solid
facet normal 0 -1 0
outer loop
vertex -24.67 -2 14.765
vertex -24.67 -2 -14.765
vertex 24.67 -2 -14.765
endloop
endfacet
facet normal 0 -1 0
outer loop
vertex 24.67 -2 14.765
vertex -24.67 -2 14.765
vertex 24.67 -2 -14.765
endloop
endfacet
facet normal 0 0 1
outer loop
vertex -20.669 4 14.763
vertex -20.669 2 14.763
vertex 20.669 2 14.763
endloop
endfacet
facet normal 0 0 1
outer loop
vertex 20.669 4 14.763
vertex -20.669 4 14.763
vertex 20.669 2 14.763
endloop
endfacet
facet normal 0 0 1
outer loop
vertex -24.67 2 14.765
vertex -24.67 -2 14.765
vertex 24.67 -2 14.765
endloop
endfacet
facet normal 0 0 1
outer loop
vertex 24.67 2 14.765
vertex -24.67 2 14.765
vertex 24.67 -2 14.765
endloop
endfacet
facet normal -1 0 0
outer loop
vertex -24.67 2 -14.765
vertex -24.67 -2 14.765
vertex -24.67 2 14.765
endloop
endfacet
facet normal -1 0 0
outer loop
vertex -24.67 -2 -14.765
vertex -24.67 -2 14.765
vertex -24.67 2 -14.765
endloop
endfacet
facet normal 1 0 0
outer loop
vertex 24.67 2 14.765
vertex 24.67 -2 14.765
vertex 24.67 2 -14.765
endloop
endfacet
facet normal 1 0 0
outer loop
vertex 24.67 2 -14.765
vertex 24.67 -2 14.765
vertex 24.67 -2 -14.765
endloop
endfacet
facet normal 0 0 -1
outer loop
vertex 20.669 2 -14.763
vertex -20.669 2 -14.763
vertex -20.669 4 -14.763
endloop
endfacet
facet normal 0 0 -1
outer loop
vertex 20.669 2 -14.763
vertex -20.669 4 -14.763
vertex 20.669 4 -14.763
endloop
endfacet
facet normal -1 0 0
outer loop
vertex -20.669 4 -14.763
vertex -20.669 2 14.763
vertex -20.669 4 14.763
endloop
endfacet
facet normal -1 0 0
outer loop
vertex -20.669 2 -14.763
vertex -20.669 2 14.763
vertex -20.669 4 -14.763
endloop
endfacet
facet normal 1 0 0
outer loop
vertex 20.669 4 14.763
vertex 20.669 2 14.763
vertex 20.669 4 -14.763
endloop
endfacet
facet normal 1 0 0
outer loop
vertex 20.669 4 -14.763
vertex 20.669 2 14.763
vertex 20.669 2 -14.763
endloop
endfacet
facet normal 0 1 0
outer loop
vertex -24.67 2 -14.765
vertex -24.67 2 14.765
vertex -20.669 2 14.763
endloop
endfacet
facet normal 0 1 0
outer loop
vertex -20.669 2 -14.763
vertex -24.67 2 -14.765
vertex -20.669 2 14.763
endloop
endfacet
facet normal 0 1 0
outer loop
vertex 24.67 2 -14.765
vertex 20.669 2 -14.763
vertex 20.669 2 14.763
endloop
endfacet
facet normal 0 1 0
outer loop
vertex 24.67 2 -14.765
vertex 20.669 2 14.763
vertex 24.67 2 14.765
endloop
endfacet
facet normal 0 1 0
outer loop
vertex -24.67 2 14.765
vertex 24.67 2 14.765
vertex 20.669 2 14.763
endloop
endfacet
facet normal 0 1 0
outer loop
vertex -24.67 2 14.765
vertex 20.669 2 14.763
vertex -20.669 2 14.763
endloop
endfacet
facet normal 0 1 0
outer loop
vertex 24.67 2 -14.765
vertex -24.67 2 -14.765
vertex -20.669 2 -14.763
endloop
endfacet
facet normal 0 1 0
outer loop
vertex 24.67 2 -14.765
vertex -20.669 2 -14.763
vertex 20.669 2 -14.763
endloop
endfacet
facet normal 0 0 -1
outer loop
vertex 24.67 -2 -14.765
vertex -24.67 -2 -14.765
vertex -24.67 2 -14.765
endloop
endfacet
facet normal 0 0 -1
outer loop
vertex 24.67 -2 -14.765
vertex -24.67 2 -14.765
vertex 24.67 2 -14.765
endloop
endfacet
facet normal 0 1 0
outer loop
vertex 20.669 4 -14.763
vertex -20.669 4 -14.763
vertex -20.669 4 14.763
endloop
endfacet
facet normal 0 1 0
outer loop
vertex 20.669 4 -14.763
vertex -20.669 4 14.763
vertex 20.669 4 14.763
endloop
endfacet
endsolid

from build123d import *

# Parameters (mm, degrees)
BOSS_EXTRUDE1_START = 2
SKETCH1_W           = 41.337660338
SKETCH1_H           = 29.52690024
BOSS_EXTRUDE1_DEPTH = 2
BOSS_EXTRUDE2_START = -2
SKETCH2_W           = 49.34
SKETCH2_H           = 29.53
BOSS_EXTRUDE2_DEPTH = 4


with BuildPart() as part:
    # Sketch1 → Boss-Extrude1 (new body)
    with BuildSketch(Plane(origin=(0, 0, 0), x_dir=(1, 0, 0), z_dir=(0, 1, 0)).offset(BOSS_EXTRUDE1_START)):
        Rectangle(SKETCH1_W, SKETCH1_H)
    extrude(amount=BOSS_EXTRUDE1_DEPTH)

    # Sketch2 → Boss-Extrude2 (add)
    with BuildSketch(Plane(origin=(0, 0, 0), x_dir=(1, 0, 0), z_dir=(0, 1, 0)).offset(BOSS_EXTRUDE2_START)):
        Rectangle(SKETCH2_W, SKETCH2_H)
    extrude(amount=BOSS_EXTRUDE2_DEPTH)


solid = part.part
